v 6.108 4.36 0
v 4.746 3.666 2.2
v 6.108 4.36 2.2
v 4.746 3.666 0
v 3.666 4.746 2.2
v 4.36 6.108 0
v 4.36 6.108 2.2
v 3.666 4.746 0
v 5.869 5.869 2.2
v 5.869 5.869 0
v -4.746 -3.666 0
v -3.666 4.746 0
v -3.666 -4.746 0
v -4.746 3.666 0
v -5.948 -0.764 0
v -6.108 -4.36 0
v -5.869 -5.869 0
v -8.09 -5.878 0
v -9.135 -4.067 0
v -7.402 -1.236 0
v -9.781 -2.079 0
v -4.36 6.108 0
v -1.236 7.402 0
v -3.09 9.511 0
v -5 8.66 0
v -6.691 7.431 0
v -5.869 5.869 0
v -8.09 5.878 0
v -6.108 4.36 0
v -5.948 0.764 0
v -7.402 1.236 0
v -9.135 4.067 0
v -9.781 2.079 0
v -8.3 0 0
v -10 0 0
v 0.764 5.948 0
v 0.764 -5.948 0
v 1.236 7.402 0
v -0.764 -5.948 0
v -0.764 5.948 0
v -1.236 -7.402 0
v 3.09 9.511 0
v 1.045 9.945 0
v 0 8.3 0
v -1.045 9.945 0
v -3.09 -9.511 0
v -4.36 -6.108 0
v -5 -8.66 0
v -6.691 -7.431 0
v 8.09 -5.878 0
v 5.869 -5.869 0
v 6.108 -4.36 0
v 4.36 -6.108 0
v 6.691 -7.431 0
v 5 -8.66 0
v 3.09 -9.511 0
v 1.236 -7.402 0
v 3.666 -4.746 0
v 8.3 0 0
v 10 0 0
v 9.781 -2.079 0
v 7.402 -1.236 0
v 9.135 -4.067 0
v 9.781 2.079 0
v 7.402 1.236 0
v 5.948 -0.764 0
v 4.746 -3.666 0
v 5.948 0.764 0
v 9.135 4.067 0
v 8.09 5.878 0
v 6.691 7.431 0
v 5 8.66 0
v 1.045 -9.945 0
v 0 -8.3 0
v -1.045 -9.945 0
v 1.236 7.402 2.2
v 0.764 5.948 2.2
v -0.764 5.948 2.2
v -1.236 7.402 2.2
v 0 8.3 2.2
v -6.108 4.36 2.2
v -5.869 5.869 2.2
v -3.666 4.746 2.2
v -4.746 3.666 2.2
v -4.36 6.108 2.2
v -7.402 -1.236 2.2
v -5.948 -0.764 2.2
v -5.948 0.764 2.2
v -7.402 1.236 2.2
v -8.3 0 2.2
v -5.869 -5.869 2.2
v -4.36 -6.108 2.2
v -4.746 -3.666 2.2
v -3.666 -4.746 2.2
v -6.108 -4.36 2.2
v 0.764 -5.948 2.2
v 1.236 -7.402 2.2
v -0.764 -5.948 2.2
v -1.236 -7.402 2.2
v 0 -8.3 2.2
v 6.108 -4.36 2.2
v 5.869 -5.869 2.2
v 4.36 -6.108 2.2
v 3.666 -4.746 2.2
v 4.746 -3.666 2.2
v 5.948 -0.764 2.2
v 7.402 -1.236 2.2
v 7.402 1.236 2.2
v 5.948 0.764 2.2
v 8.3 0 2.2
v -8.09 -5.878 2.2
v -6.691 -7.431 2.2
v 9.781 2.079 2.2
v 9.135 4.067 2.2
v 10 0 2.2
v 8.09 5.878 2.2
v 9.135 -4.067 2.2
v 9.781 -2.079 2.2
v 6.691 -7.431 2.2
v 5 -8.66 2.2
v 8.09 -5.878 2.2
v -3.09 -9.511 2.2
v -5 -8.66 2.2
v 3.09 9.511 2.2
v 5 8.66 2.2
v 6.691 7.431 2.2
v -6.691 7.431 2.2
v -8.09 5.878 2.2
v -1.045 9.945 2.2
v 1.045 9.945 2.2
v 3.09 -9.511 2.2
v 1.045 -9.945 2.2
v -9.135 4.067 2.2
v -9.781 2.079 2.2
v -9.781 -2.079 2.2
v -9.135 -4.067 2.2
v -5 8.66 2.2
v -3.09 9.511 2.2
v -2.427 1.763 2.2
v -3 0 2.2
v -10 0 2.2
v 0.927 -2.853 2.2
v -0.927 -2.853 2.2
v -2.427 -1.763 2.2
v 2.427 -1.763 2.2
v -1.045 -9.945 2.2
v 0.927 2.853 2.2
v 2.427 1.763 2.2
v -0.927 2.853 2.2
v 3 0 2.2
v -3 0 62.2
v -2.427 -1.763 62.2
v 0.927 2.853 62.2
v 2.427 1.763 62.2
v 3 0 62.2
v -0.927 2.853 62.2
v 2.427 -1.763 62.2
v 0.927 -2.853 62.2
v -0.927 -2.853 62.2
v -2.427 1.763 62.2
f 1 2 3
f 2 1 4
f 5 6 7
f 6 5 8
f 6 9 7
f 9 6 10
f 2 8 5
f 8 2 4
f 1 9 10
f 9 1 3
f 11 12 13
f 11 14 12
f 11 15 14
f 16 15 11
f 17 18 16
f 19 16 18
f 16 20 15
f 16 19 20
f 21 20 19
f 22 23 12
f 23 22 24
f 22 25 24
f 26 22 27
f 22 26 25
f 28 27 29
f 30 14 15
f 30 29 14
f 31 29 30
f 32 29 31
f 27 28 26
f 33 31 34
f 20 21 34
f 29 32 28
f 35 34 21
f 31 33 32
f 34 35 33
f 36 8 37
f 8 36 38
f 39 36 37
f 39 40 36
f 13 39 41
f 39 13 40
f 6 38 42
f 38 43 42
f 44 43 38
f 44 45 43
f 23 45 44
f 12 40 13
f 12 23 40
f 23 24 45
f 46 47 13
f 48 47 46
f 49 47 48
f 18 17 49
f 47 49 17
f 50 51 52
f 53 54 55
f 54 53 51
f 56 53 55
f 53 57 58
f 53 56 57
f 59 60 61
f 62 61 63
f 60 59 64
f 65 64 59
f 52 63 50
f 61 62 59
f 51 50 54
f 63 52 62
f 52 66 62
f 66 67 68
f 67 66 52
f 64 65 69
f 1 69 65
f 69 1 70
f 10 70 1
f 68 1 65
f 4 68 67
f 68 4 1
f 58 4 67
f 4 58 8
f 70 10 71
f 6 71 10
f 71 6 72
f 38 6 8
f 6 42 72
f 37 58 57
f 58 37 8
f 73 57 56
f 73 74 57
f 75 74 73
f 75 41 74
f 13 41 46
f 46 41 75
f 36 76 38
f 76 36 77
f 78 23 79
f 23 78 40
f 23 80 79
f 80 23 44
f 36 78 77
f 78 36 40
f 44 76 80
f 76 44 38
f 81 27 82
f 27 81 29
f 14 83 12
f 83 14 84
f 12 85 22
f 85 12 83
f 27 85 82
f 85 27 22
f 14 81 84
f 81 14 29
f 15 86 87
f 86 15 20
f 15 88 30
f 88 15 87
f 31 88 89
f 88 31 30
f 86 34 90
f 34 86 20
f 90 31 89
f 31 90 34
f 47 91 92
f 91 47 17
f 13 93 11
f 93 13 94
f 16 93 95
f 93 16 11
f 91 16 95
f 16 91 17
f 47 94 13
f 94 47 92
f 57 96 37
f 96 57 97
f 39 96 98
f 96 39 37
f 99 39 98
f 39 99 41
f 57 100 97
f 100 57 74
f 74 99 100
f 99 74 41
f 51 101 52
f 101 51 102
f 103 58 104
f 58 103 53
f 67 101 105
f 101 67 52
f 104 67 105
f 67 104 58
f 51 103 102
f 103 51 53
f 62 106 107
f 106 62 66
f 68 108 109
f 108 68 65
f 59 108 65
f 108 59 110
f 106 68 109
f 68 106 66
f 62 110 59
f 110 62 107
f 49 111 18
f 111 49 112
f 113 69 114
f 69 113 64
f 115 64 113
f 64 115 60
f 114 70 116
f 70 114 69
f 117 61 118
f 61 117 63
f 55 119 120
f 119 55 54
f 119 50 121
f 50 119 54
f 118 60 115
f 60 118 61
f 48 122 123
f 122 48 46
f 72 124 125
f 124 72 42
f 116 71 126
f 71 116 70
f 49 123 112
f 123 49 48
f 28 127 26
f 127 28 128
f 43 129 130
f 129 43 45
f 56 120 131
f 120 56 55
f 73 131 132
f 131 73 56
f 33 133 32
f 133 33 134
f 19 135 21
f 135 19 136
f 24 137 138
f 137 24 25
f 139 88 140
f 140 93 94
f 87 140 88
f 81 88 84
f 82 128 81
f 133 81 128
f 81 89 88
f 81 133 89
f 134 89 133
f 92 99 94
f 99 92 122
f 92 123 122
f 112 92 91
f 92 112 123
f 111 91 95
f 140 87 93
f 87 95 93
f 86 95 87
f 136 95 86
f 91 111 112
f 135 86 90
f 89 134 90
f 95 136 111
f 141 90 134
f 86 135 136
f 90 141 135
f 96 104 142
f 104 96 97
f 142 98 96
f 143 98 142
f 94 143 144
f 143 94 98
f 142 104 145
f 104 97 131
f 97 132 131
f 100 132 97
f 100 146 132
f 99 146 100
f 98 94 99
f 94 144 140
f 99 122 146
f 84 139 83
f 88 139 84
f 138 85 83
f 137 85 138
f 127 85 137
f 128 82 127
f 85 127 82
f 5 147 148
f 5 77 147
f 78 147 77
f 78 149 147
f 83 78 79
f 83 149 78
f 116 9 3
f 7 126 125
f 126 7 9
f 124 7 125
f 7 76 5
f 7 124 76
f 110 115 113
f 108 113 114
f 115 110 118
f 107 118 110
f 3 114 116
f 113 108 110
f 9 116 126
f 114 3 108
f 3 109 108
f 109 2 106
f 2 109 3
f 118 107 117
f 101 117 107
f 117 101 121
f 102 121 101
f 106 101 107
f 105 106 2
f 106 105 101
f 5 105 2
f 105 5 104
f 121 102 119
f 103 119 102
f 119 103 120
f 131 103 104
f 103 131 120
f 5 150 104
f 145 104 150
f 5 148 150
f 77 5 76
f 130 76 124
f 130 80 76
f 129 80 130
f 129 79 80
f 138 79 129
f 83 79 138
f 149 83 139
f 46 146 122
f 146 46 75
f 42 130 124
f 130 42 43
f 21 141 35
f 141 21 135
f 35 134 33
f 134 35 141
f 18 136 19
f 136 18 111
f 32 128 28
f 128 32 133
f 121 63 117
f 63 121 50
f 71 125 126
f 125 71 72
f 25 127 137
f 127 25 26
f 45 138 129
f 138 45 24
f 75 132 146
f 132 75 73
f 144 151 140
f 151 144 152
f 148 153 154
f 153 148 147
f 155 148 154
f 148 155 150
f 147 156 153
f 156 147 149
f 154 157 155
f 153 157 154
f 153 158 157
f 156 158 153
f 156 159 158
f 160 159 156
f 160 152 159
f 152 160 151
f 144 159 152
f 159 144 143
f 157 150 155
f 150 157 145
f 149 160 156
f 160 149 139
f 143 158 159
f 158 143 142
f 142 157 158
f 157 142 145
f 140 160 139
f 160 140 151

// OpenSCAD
// file: ../util/screws.scad
module screws(screwsCount=8, screwsSpacing=14, screwsDiameter=2.6)
{
    for (screw=[1:screwsCount]) {
        rotate([0,0,screw*360/screwsCount])
            translate([screwsSpacing/2,0,0])
            cylinder(d=screwsDiameter, h=100);
    }
}
// main file
use <../util/screws.scad>;

//:Part
module bar(height=60, barRadius=3, bottomRadius=10, thickness=2.2, 
        screwsCount=8, screwsSpacing=14, screwsDiameter=2.6) {

    union() {
        difference() {
            cylinder(r=bottomRadius, h=thickness);
            screws(screwsCount, screwsSpacing, screwsDiameter);
        }
        cylinder(r=barRadius,h=(height+thickness));
    }
}

bar();
